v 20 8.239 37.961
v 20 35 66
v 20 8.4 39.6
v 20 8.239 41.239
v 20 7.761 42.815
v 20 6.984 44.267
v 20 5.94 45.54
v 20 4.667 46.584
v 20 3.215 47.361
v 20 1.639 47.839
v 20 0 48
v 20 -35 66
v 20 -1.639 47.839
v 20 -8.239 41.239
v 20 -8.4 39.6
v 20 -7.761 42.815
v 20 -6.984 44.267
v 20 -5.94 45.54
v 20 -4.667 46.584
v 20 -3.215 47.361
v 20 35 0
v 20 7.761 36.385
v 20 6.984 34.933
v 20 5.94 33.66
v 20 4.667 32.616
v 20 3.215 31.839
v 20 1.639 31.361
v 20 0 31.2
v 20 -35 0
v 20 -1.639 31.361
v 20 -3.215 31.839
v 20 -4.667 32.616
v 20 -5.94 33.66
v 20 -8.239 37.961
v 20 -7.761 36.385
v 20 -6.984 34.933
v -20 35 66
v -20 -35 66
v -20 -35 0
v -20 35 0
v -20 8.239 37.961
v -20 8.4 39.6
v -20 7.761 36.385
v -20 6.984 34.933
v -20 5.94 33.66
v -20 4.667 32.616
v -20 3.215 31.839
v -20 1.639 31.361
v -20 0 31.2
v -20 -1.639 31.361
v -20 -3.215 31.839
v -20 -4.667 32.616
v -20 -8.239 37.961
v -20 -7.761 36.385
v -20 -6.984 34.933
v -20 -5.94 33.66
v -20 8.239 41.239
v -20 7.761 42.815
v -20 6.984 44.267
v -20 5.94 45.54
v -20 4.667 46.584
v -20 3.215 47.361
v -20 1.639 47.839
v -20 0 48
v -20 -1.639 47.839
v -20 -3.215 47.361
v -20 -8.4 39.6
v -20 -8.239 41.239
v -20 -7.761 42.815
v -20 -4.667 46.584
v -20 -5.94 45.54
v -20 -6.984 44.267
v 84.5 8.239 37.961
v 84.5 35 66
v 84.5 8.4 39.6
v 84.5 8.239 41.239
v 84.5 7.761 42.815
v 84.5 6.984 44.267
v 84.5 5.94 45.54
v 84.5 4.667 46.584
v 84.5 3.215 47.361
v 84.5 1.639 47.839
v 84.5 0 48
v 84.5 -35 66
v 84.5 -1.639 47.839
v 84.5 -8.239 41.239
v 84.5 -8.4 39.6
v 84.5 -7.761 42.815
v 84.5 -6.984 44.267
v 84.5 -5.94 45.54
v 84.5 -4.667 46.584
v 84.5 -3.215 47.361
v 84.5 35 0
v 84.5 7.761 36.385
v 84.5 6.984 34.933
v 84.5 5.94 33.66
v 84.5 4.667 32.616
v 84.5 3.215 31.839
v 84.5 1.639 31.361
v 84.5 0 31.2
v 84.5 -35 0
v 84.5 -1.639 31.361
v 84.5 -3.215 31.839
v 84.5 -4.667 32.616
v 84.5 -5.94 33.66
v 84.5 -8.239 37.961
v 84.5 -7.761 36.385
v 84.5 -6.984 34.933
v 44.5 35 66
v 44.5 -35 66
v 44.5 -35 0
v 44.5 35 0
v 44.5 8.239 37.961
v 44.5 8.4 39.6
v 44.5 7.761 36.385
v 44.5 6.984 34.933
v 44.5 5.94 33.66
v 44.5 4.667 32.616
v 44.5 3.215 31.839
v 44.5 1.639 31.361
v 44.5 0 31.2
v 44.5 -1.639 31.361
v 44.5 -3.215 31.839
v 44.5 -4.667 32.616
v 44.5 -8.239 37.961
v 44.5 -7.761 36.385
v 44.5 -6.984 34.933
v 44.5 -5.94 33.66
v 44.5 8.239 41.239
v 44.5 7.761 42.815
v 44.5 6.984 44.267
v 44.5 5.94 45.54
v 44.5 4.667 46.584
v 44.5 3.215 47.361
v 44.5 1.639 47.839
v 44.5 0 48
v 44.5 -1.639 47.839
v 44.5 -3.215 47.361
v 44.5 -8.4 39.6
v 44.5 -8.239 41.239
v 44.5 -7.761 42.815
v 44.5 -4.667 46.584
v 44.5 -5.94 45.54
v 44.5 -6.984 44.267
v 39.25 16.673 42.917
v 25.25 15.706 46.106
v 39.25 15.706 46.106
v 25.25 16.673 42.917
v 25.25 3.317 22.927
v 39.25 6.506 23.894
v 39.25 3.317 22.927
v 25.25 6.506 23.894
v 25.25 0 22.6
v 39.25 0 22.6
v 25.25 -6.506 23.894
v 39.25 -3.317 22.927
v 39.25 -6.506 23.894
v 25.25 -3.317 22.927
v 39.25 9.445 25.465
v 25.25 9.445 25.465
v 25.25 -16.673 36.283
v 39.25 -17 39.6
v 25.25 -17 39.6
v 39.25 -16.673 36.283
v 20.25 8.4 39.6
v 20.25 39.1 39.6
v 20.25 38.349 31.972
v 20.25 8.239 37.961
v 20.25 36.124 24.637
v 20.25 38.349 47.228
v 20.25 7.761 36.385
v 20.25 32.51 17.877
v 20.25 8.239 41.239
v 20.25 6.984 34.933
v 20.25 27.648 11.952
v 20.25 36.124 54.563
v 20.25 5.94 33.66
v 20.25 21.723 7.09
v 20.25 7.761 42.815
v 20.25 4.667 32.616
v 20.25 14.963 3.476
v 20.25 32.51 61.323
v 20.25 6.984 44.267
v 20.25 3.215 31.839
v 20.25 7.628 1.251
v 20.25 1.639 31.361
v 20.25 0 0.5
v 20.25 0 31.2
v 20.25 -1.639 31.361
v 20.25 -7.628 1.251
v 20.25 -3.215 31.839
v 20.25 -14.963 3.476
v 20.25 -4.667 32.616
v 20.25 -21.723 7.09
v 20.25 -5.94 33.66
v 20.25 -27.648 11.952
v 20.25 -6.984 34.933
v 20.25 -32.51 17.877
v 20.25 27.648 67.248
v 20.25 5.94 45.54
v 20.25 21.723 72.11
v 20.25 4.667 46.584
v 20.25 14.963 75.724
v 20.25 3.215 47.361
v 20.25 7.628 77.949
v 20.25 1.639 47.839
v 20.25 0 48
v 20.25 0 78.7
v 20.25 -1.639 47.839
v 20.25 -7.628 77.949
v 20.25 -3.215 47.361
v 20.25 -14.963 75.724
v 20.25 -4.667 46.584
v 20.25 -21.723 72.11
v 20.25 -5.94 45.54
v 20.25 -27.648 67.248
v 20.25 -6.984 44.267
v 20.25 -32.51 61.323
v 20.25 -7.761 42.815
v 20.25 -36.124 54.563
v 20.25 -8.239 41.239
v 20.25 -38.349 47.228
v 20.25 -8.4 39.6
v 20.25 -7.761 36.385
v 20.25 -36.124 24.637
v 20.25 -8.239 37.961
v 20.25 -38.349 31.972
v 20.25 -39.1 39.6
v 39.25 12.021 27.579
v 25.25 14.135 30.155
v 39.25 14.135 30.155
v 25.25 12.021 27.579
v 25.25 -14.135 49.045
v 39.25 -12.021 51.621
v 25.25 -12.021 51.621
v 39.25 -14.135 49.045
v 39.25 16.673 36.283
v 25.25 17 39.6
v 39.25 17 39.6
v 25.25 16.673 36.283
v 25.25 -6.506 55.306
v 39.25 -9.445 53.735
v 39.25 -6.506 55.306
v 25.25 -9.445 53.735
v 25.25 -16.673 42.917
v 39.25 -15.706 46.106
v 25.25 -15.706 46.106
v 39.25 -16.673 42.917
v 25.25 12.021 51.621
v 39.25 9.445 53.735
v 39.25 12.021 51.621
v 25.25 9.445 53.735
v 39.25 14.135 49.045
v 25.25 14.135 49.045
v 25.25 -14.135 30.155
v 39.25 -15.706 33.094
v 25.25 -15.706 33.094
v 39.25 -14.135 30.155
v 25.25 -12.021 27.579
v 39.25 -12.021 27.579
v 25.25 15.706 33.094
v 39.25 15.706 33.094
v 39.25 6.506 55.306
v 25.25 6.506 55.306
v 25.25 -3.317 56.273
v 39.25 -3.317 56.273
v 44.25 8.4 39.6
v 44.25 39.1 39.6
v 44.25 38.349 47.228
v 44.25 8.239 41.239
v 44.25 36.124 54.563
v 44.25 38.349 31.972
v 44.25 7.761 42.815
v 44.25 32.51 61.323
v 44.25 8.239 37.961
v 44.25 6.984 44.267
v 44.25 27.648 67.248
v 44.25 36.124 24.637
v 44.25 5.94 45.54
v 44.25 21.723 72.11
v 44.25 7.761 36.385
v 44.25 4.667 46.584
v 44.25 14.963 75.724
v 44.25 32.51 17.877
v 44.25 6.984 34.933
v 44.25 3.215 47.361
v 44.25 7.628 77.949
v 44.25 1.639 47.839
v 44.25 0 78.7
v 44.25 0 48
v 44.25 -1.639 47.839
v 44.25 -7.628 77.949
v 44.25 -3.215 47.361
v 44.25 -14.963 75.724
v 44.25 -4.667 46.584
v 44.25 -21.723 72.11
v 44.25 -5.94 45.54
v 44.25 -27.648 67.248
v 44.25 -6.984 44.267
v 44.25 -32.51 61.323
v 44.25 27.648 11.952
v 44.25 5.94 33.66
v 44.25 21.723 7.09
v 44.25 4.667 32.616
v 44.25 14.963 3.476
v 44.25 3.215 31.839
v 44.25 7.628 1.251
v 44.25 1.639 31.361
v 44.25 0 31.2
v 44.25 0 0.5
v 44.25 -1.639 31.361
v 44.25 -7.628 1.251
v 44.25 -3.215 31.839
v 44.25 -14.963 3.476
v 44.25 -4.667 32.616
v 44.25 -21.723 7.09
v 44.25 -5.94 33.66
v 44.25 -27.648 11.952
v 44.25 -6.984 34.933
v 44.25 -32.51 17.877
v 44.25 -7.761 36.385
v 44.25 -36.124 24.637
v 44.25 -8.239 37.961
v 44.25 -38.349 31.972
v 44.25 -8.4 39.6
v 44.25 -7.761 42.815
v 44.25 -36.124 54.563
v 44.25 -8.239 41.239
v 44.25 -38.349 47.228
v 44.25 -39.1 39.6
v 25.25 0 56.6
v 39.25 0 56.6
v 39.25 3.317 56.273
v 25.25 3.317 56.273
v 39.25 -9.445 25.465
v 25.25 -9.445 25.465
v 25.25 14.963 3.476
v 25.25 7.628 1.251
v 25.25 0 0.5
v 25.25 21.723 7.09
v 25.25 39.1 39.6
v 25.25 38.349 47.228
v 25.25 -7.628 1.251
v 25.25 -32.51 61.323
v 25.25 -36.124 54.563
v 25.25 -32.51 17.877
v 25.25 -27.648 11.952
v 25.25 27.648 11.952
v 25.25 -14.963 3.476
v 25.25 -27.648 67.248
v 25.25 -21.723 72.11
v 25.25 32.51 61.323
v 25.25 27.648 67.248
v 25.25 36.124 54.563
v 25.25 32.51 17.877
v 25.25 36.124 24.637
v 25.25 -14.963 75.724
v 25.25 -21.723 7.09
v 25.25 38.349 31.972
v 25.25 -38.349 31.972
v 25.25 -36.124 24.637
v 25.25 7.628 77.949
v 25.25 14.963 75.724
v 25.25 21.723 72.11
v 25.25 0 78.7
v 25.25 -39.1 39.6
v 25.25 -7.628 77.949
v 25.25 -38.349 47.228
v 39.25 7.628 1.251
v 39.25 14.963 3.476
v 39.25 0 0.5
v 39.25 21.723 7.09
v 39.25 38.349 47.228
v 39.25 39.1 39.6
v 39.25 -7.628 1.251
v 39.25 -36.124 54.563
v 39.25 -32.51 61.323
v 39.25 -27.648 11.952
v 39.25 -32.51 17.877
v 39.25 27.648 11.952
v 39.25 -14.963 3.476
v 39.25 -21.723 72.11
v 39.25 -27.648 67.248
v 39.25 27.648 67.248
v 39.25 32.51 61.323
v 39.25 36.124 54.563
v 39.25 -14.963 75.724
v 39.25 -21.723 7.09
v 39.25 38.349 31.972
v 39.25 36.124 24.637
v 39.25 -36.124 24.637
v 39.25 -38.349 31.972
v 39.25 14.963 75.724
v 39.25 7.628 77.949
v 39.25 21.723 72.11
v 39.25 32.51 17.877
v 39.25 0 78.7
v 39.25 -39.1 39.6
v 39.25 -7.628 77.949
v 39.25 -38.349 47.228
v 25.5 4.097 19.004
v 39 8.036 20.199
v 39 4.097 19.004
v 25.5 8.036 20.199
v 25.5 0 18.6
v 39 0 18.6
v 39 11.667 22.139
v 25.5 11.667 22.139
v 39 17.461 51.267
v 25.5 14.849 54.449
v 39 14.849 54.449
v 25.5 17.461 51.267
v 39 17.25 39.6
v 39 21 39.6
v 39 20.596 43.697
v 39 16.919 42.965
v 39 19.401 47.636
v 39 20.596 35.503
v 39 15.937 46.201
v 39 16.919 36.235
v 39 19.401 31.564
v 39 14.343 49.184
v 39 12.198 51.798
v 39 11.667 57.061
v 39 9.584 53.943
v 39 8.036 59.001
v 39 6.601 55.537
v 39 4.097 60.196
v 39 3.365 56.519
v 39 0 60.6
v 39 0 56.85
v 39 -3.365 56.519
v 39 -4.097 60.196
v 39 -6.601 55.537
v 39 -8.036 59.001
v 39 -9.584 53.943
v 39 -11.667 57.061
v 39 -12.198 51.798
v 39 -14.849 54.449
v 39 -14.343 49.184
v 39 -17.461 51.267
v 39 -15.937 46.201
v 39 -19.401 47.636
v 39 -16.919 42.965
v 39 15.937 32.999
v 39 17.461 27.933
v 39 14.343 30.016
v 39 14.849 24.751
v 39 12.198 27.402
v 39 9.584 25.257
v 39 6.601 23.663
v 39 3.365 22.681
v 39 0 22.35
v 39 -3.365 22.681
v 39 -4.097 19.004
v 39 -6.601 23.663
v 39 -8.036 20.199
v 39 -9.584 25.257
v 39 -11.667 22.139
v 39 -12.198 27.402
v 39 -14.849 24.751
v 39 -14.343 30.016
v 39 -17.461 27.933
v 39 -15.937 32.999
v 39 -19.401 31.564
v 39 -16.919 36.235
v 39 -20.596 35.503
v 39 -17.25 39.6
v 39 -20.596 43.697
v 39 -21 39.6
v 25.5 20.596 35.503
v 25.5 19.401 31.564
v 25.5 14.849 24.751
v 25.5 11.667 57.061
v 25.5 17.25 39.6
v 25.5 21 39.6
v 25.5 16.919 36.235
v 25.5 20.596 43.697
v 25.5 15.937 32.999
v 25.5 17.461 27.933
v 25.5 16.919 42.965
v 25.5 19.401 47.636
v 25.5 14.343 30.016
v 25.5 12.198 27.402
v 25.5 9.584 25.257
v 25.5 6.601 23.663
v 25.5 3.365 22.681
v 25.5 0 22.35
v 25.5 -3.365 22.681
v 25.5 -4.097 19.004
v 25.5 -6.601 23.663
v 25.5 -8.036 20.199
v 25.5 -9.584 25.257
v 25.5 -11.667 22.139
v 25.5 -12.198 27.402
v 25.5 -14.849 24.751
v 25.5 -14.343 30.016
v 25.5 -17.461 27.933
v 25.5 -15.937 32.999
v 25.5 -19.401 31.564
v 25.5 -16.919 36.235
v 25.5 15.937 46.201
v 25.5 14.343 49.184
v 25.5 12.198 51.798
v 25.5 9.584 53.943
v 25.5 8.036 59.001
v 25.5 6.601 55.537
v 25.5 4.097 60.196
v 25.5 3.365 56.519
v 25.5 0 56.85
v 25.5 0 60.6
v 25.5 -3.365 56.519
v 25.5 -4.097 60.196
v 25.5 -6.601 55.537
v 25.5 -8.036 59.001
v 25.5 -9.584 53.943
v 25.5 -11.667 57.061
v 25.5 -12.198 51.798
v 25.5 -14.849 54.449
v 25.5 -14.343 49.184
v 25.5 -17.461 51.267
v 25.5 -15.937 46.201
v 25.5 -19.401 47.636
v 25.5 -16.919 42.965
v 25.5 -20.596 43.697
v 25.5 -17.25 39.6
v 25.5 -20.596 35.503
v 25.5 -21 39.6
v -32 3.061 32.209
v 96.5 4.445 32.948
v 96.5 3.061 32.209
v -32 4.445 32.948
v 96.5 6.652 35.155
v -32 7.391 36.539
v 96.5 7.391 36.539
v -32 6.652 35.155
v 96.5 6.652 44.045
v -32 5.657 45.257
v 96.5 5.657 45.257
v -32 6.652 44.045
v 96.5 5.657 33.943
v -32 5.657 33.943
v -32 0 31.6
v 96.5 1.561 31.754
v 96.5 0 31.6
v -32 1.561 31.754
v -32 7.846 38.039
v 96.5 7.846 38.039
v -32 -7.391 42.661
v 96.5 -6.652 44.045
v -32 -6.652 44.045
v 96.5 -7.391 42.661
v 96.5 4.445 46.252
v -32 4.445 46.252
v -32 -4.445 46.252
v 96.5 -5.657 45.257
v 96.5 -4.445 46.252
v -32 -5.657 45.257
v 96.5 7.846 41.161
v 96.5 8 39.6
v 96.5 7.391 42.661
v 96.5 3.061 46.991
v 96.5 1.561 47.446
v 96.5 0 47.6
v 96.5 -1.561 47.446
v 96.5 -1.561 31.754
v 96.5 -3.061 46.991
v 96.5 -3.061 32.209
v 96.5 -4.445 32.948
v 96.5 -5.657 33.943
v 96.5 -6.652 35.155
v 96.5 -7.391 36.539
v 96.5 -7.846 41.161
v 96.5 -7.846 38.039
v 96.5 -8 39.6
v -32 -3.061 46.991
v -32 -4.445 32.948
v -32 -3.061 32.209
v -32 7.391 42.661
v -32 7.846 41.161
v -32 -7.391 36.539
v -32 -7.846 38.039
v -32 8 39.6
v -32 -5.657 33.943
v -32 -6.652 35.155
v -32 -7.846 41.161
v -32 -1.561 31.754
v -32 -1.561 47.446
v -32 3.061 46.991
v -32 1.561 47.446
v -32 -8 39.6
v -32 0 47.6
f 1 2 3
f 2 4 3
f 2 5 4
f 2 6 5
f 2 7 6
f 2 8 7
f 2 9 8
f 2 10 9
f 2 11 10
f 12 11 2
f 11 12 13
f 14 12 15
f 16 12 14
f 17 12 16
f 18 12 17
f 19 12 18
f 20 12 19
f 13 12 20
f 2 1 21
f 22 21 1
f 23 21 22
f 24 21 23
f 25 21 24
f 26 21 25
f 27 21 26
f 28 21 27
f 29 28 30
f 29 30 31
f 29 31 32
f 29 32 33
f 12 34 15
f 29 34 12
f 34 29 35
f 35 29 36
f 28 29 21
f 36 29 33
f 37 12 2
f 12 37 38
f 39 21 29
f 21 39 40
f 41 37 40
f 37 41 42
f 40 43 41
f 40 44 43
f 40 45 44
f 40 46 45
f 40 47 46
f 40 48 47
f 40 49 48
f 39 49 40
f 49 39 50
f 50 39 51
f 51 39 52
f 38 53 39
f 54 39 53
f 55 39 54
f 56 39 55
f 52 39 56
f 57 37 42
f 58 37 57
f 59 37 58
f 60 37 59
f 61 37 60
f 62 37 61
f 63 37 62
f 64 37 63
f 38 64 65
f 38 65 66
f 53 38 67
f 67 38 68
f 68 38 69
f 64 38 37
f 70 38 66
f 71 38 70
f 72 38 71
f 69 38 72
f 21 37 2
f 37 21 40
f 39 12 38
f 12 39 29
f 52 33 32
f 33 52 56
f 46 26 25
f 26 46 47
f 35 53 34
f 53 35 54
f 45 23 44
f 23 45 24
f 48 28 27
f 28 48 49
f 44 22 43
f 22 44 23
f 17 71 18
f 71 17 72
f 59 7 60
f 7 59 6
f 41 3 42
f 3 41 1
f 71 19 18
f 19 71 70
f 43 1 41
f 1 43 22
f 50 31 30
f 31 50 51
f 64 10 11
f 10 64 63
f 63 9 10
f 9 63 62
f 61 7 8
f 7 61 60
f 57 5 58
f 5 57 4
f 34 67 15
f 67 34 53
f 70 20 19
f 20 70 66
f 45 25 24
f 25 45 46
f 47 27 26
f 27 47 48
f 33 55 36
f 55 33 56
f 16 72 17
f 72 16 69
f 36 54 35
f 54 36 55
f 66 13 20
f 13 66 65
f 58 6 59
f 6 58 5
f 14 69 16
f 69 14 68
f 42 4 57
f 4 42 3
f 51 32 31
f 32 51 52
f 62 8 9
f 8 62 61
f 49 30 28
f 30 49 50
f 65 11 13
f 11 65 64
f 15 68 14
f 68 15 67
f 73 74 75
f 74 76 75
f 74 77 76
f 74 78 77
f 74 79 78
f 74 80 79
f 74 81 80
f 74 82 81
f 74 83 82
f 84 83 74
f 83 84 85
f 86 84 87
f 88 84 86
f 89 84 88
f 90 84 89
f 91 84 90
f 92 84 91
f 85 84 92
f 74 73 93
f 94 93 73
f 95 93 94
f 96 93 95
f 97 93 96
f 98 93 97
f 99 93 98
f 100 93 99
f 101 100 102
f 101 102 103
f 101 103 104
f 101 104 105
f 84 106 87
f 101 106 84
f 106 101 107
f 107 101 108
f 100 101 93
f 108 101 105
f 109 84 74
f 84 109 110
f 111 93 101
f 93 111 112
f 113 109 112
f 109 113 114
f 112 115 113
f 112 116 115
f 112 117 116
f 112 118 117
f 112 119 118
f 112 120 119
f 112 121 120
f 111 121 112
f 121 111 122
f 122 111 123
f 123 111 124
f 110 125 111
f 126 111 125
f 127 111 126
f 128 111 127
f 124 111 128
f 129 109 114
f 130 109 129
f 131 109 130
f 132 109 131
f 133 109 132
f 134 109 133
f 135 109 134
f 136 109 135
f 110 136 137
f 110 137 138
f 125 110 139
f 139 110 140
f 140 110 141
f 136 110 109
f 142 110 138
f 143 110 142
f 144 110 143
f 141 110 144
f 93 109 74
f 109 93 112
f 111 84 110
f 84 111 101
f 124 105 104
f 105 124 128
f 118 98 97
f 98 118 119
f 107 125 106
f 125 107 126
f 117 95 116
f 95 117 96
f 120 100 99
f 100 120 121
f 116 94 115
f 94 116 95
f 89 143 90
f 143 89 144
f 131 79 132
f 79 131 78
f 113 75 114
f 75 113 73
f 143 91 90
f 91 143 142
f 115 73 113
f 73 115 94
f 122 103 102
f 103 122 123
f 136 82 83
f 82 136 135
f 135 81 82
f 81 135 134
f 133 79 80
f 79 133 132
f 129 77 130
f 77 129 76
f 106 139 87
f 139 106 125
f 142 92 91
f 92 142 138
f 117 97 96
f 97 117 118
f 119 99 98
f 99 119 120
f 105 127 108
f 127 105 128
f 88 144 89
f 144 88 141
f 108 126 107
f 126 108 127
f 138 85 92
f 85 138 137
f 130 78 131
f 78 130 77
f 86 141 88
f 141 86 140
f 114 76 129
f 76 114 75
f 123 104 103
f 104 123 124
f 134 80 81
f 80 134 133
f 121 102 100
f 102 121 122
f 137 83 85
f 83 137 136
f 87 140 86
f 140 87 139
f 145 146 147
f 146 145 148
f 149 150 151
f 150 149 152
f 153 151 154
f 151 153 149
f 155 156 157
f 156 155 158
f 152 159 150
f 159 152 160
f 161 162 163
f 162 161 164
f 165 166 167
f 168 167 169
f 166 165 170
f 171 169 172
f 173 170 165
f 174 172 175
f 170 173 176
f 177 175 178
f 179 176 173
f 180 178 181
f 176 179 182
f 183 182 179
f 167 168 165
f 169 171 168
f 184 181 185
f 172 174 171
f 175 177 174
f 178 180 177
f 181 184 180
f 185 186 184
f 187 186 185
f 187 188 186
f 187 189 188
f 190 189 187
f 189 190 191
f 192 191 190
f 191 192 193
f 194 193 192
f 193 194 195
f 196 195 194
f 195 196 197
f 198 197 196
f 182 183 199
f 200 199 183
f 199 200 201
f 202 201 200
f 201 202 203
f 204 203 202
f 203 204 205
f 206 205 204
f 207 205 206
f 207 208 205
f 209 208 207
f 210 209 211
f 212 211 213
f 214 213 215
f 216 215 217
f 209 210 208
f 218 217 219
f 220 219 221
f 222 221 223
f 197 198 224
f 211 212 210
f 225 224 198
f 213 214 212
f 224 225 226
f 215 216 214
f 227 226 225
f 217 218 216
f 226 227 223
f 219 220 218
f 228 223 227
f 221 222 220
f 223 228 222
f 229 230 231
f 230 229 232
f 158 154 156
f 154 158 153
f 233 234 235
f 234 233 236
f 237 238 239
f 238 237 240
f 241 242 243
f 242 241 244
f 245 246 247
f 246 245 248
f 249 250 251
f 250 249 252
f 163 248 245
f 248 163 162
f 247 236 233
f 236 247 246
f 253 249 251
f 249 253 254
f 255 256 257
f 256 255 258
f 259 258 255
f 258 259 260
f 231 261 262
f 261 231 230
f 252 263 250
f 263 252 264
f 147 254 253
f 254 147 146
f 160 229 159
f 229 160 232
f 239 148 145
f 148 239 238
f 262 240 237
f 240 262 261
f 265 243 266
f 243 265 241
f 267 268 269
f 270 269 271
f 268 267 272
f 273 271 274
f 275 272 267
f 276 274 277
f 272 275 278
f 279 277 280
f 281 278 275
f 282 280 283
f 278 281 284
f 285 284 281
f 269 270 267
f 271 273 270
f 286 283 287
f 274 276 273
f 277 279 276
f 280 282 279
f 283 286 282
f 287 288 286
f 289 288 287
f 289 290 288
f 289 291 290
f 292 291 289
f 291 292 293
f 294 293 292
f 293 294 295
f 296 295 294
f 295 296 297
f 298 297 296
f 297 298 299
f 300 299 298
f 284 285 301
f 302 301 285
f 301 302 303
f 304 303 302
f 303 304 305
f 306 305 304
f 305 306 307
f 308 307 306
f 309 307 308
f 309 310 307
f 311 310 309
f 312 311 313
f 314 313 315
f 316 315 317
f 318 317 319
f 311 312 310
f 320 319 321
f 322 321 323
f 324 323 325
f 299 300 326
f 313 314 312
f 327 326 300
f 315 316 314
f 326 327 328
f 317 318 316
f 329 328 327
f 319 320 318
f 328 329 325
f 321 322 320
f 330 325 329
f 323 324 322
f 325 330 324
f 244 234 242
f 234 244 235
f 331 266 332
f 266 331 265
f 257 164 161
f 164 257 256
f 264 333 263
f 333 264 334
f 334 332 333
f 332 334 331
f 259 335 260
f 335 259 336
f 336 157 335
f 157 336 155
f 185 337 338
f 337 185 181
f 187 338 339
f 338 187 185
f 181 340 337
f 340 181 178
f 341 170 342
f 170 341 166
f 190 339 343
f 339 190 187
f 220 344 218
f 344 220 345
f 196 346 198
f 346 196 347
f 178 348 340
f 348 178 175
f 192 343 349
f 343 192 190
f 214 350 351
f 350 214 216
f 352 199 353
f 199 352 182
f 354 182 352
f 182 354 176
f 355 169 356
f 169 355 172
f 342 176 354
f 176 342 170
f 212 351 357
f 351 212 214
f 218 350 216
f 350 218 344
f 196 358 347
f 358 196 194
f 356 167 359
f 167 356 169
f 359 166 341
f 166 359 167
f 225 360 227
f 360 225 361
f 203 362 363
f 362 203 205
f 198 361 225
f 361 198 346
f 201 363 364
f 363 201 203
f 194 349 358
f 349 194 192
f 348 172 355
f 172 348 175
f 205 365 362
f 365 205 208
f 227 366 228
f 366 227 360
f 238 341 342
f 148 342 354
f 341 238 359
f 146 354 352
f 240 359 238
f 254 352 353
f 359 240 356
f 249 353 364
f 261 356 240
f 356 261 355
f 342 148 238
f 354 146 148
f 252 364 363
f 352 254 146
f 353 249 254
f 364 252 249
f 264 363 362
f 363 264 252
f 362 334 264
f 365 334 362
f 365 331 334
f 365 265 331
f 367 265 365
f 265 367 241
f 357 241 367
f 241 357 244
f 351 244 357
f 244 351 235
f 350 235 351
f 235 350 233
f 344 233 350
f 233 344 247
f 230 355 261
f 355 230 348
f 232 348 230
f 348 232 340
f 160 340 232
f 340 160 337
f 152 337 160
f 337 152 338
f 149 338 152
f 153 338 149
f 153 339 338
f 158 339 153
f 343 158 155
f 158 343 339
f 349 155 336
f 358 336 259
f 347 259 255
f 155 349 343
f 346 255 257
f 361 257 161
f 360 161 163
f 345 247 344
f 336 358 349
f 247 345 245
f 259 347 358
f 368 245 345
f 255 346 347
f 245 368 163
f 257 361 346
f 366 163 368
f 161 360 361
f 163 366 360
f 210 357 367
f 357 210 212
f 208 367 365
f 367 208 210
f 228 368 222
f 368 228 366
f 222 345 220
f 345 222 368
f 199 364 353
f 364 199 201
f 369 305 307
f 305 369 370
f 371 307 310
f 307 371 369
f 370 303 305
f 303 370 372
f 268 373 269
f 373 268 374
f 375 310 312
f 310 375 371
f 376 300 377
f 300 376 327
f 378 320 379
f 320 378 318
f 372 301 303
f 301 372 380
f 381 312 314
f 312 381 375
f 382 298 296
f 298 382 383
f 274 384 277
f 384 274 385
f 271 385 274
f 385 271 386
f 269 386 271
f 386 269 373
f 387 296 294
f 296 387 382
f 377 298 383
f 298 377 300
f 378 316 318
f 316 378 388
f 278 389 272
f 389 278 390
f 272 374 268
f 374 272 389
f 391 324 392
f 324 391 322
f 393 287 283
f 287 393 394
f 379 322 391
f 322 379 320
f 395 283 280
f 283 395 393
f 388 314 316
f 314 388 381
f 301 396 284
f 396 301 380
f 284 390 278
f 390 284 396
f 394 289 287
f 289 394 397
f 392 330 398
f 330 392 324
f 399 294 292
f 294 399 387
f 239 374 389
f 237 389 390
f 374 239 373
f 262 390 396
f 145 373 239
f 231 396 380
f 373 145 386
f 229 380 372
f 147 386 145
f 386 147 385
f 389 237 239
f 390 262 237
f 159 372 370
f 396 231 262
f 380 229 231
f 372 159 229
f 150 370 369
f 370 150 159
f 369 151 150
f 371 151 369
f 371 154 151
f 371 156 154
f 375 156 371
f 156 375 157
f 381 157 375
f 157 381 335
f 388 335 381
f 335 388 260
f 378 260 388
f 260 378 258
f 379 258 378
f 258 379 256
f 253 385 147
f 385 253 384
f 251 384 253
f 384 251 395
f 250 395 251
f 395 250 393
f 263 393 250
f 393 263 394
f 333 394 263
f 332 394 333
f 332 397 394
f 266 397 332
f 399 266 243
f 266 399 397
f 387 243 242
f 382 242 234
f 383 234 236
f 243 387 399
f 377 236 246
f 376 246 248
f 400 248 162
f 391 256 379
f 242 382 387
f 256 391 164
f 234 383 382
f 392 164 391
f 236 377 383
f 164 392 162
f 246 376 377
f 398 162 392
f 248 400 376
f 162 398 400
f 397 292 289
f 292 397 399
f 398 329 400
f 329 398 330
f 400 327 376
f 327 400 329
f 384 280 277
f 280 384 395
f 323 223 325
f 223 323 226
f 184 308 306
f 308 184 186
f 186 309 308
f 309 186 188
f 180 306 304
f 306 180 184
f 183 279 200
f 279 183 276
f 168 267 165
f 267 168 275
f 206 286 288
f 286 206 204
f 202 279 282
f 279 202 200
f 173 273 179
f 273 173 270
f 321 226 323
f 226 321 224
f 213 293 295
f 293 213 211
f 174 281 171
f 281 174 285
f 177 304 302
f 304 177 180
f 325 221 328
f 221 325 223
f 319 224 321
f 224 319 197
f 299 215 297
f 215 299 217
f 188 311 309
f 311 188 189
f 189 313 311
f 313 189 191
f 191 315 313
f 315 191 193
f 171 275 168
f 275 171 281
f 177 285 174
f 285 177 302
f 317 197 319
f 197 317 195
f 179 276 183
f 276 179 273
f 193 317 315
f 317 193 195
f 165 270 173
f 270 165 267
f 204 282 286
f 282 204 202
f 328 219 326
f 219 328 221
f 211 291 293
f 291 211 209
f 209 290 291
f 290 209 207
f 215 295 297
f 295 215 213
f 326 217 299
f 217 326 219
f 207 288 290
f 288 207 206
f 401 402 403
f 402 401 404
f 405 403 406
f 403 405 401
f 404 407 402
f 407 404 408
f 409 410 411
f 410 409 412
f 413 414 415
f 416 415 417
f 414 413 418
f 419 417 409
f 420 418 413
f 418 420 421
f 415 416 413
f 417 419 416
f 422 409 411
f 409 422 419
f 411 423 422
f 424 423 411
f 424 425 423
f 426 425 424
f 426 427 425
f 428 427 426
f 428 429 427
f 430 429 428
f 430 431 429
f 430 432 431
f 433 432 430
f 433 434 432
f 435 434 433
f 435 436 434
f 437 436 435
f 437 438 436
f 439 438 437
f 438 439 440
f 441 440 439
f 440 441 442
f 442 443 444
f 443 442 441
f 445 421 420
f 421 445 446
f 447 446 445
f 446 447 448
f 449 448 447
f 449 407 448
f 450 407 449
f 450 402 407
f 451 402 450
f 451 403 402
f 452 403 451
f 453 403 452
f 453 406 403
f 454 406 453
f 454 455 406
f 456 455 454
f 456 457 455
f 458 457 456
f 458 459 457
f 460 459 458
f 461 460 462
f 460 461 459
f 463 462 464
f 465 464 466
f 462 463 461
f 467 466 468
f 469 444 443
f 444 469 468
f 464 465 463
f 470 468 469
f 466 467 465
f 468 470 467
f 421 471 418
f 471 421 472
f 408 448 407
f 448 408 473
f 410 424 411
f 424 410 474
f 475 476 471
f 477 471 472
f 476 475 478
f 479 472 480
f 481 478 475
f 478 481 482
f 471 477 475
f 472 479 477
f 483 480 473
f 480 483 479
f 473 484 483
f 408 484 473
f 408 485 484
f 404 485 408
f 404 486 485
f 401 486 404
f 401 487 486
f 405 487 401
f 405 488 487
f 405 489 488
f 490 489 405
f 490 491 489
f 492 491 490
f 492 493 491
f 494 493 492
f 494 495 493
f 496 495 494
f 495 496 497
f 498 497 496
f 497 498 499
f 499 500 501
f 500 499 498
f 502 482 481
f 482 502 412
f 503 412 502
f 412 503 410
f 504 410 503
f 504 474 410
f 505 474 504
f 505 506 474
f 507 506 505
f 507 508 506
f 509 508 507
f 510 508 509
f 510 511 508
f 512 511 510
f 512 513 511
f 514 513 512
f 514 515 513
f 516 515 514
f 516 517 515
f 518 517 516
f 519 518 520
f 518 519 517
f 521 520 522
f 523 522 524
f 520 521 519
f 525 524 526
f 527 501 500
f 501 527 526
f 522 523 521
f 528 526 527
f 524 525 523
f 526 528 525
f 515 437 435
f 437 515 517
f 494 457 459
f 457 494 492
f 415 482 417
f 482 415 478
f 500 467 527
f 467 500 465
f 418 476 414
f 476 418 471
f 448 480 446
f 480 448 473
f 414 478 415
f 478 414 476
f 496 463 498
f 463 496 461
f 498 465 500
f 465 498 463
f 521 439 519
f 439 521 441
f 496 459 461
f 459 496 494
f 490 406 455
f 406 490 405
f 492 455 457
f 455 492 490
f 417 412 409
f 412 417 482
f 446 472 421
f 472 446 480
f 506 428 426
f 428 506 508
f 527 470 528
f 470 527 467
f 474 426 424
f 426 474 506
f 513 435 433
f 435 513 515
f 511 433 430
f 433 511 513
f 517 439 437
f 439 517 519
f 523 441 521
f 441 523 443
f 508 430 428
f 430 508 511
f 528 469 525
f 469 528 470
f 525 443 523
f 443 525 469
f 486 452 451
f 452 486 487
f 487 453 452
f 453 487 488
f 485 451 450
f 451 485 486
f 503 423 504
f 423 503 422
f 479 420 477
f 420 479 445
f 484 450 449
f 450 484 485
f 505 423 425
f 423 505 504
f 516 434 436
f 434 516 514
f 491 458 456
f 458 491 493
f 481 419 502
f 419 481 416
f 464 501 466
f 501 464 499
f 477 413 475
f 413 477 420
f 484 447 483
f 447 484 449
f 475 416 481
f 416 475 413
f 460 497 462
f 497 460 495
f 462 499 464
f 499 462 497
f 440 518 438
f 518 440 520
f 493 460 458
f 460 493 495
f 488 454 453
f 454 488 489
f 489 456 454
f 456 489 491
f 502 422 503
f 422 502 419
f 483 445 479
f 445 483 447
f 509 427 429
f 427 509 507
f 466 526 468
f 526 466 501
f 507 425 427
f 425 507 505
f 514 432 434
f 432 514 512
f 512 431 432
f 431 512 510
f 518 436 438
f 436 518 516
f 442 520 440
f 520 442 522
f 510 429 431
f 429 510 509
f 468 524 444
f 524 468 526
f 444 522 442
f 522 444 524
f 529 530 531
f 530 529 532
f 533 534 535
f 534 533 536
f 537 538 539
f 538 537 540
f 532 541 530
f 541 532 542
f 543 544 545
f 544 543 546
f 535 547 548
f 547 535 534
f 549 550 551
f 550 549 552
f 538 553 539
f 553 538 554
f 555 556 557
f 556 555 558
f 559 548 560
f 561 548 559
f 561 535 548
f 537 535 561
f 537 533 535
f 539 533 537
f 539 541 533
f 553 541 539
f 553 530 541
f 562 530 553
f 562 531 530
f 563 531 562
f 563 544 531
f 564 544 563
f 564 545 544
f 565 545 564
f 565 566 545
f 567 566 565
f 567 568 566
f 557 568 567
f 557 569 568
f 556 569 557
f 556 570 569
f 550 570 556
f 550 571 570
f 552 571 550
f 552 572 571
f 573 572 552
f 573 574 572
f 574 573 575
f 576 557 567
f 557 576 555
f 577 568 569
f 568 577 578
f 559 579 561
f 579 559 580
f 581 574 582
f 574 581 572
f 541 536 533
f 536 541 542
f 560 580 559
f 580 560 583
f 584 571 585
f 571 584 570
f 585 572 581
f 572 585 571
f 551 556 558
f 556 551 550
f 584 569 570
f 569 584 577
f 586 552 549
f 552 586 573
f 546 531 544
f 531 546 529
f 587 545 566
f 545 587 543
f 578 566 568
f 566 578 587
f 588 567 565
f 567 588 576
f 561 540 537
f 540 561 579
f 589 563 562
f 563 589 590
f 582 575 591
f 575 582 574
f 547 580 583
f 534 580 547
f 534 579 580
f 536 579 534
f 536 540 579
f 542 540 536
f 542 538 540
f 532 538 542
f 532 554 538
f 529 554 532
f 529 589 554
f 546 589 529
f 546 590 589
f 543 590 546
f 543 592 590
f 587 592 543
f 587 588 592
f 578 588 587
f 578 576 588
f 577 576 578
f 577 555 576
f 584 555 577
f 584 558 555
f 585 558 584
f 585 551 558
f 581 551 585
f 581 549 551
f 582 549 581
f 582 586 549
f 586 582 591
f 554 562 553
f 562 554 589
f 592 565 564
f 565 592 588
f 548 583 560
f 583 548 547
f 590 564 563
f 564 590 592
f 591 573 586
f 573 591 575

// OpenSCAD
$fn = 32;

// ------------------------------------------------------------------------
// Pulley assembly: d78.2 pulley with a belt, shaft d16
// Every part is its own module, assembly() places them once.
// ------------------------------------------------------------------------

// --- part 1 ---
module support1() {
  difference() {
    translate([-20, -35, 0]) cube([40, 70, 66]);
    translate([0, 0, 39.6]) rotate([0, 90, 0]) cylinder(h = 42, d = 16.8, center = true);
  }
}

// --- part 2 ---
module support2() {
  difference() {
    translate([-20, -35, 0]) cube([40, 70, 66]);
    translate([0, 0, 39.6]) rotate([0, 90, 0]) cylinder(h = 42, d = 16.8, center = true);
  }
}

// --- part 3 ---
module shaft() {
  translate([0, 0, -64.25]) cylinder(h = 128.5, d = 16);
}

// --- part 4 ---
module pulley() {
  difference() {
    union() {
      cylinder(h = 24, d = 34);
      cylinder(h = 5, d = 78.2);
      translate([0, 0, 19]) cylinder(h = 5, d = 78.2);
    }
    translate([0, 0, -1]) cylinder(h = 26, d = 16.8);
  }
}

// --- part 5 ---
module belt() {
  difference() {
      translate([0, 0, 0]) cylinder(h = 13.5, d = 42);
      translate([0, 0, -1]) cylinder(h = 15.5, d = 34.5);
    }
}

// --- assembly ---
module assembly() {
  translate([0, 0, 0]) rotate([0, 0, 0]) support1();
  translate([64.5, 0, 0]) rotate([0, 0, 0]) support2();
  translate([32.25, 0, 39.6]) rotate([0, 90, 0]) shaft();
  translate([20.25, 0, 39.6]) rotate([0, 90, 0]) pulley();
  translate([25.5, 0, 39.6]) rotate([0, 90, 0]) belt();
}

assembly();
